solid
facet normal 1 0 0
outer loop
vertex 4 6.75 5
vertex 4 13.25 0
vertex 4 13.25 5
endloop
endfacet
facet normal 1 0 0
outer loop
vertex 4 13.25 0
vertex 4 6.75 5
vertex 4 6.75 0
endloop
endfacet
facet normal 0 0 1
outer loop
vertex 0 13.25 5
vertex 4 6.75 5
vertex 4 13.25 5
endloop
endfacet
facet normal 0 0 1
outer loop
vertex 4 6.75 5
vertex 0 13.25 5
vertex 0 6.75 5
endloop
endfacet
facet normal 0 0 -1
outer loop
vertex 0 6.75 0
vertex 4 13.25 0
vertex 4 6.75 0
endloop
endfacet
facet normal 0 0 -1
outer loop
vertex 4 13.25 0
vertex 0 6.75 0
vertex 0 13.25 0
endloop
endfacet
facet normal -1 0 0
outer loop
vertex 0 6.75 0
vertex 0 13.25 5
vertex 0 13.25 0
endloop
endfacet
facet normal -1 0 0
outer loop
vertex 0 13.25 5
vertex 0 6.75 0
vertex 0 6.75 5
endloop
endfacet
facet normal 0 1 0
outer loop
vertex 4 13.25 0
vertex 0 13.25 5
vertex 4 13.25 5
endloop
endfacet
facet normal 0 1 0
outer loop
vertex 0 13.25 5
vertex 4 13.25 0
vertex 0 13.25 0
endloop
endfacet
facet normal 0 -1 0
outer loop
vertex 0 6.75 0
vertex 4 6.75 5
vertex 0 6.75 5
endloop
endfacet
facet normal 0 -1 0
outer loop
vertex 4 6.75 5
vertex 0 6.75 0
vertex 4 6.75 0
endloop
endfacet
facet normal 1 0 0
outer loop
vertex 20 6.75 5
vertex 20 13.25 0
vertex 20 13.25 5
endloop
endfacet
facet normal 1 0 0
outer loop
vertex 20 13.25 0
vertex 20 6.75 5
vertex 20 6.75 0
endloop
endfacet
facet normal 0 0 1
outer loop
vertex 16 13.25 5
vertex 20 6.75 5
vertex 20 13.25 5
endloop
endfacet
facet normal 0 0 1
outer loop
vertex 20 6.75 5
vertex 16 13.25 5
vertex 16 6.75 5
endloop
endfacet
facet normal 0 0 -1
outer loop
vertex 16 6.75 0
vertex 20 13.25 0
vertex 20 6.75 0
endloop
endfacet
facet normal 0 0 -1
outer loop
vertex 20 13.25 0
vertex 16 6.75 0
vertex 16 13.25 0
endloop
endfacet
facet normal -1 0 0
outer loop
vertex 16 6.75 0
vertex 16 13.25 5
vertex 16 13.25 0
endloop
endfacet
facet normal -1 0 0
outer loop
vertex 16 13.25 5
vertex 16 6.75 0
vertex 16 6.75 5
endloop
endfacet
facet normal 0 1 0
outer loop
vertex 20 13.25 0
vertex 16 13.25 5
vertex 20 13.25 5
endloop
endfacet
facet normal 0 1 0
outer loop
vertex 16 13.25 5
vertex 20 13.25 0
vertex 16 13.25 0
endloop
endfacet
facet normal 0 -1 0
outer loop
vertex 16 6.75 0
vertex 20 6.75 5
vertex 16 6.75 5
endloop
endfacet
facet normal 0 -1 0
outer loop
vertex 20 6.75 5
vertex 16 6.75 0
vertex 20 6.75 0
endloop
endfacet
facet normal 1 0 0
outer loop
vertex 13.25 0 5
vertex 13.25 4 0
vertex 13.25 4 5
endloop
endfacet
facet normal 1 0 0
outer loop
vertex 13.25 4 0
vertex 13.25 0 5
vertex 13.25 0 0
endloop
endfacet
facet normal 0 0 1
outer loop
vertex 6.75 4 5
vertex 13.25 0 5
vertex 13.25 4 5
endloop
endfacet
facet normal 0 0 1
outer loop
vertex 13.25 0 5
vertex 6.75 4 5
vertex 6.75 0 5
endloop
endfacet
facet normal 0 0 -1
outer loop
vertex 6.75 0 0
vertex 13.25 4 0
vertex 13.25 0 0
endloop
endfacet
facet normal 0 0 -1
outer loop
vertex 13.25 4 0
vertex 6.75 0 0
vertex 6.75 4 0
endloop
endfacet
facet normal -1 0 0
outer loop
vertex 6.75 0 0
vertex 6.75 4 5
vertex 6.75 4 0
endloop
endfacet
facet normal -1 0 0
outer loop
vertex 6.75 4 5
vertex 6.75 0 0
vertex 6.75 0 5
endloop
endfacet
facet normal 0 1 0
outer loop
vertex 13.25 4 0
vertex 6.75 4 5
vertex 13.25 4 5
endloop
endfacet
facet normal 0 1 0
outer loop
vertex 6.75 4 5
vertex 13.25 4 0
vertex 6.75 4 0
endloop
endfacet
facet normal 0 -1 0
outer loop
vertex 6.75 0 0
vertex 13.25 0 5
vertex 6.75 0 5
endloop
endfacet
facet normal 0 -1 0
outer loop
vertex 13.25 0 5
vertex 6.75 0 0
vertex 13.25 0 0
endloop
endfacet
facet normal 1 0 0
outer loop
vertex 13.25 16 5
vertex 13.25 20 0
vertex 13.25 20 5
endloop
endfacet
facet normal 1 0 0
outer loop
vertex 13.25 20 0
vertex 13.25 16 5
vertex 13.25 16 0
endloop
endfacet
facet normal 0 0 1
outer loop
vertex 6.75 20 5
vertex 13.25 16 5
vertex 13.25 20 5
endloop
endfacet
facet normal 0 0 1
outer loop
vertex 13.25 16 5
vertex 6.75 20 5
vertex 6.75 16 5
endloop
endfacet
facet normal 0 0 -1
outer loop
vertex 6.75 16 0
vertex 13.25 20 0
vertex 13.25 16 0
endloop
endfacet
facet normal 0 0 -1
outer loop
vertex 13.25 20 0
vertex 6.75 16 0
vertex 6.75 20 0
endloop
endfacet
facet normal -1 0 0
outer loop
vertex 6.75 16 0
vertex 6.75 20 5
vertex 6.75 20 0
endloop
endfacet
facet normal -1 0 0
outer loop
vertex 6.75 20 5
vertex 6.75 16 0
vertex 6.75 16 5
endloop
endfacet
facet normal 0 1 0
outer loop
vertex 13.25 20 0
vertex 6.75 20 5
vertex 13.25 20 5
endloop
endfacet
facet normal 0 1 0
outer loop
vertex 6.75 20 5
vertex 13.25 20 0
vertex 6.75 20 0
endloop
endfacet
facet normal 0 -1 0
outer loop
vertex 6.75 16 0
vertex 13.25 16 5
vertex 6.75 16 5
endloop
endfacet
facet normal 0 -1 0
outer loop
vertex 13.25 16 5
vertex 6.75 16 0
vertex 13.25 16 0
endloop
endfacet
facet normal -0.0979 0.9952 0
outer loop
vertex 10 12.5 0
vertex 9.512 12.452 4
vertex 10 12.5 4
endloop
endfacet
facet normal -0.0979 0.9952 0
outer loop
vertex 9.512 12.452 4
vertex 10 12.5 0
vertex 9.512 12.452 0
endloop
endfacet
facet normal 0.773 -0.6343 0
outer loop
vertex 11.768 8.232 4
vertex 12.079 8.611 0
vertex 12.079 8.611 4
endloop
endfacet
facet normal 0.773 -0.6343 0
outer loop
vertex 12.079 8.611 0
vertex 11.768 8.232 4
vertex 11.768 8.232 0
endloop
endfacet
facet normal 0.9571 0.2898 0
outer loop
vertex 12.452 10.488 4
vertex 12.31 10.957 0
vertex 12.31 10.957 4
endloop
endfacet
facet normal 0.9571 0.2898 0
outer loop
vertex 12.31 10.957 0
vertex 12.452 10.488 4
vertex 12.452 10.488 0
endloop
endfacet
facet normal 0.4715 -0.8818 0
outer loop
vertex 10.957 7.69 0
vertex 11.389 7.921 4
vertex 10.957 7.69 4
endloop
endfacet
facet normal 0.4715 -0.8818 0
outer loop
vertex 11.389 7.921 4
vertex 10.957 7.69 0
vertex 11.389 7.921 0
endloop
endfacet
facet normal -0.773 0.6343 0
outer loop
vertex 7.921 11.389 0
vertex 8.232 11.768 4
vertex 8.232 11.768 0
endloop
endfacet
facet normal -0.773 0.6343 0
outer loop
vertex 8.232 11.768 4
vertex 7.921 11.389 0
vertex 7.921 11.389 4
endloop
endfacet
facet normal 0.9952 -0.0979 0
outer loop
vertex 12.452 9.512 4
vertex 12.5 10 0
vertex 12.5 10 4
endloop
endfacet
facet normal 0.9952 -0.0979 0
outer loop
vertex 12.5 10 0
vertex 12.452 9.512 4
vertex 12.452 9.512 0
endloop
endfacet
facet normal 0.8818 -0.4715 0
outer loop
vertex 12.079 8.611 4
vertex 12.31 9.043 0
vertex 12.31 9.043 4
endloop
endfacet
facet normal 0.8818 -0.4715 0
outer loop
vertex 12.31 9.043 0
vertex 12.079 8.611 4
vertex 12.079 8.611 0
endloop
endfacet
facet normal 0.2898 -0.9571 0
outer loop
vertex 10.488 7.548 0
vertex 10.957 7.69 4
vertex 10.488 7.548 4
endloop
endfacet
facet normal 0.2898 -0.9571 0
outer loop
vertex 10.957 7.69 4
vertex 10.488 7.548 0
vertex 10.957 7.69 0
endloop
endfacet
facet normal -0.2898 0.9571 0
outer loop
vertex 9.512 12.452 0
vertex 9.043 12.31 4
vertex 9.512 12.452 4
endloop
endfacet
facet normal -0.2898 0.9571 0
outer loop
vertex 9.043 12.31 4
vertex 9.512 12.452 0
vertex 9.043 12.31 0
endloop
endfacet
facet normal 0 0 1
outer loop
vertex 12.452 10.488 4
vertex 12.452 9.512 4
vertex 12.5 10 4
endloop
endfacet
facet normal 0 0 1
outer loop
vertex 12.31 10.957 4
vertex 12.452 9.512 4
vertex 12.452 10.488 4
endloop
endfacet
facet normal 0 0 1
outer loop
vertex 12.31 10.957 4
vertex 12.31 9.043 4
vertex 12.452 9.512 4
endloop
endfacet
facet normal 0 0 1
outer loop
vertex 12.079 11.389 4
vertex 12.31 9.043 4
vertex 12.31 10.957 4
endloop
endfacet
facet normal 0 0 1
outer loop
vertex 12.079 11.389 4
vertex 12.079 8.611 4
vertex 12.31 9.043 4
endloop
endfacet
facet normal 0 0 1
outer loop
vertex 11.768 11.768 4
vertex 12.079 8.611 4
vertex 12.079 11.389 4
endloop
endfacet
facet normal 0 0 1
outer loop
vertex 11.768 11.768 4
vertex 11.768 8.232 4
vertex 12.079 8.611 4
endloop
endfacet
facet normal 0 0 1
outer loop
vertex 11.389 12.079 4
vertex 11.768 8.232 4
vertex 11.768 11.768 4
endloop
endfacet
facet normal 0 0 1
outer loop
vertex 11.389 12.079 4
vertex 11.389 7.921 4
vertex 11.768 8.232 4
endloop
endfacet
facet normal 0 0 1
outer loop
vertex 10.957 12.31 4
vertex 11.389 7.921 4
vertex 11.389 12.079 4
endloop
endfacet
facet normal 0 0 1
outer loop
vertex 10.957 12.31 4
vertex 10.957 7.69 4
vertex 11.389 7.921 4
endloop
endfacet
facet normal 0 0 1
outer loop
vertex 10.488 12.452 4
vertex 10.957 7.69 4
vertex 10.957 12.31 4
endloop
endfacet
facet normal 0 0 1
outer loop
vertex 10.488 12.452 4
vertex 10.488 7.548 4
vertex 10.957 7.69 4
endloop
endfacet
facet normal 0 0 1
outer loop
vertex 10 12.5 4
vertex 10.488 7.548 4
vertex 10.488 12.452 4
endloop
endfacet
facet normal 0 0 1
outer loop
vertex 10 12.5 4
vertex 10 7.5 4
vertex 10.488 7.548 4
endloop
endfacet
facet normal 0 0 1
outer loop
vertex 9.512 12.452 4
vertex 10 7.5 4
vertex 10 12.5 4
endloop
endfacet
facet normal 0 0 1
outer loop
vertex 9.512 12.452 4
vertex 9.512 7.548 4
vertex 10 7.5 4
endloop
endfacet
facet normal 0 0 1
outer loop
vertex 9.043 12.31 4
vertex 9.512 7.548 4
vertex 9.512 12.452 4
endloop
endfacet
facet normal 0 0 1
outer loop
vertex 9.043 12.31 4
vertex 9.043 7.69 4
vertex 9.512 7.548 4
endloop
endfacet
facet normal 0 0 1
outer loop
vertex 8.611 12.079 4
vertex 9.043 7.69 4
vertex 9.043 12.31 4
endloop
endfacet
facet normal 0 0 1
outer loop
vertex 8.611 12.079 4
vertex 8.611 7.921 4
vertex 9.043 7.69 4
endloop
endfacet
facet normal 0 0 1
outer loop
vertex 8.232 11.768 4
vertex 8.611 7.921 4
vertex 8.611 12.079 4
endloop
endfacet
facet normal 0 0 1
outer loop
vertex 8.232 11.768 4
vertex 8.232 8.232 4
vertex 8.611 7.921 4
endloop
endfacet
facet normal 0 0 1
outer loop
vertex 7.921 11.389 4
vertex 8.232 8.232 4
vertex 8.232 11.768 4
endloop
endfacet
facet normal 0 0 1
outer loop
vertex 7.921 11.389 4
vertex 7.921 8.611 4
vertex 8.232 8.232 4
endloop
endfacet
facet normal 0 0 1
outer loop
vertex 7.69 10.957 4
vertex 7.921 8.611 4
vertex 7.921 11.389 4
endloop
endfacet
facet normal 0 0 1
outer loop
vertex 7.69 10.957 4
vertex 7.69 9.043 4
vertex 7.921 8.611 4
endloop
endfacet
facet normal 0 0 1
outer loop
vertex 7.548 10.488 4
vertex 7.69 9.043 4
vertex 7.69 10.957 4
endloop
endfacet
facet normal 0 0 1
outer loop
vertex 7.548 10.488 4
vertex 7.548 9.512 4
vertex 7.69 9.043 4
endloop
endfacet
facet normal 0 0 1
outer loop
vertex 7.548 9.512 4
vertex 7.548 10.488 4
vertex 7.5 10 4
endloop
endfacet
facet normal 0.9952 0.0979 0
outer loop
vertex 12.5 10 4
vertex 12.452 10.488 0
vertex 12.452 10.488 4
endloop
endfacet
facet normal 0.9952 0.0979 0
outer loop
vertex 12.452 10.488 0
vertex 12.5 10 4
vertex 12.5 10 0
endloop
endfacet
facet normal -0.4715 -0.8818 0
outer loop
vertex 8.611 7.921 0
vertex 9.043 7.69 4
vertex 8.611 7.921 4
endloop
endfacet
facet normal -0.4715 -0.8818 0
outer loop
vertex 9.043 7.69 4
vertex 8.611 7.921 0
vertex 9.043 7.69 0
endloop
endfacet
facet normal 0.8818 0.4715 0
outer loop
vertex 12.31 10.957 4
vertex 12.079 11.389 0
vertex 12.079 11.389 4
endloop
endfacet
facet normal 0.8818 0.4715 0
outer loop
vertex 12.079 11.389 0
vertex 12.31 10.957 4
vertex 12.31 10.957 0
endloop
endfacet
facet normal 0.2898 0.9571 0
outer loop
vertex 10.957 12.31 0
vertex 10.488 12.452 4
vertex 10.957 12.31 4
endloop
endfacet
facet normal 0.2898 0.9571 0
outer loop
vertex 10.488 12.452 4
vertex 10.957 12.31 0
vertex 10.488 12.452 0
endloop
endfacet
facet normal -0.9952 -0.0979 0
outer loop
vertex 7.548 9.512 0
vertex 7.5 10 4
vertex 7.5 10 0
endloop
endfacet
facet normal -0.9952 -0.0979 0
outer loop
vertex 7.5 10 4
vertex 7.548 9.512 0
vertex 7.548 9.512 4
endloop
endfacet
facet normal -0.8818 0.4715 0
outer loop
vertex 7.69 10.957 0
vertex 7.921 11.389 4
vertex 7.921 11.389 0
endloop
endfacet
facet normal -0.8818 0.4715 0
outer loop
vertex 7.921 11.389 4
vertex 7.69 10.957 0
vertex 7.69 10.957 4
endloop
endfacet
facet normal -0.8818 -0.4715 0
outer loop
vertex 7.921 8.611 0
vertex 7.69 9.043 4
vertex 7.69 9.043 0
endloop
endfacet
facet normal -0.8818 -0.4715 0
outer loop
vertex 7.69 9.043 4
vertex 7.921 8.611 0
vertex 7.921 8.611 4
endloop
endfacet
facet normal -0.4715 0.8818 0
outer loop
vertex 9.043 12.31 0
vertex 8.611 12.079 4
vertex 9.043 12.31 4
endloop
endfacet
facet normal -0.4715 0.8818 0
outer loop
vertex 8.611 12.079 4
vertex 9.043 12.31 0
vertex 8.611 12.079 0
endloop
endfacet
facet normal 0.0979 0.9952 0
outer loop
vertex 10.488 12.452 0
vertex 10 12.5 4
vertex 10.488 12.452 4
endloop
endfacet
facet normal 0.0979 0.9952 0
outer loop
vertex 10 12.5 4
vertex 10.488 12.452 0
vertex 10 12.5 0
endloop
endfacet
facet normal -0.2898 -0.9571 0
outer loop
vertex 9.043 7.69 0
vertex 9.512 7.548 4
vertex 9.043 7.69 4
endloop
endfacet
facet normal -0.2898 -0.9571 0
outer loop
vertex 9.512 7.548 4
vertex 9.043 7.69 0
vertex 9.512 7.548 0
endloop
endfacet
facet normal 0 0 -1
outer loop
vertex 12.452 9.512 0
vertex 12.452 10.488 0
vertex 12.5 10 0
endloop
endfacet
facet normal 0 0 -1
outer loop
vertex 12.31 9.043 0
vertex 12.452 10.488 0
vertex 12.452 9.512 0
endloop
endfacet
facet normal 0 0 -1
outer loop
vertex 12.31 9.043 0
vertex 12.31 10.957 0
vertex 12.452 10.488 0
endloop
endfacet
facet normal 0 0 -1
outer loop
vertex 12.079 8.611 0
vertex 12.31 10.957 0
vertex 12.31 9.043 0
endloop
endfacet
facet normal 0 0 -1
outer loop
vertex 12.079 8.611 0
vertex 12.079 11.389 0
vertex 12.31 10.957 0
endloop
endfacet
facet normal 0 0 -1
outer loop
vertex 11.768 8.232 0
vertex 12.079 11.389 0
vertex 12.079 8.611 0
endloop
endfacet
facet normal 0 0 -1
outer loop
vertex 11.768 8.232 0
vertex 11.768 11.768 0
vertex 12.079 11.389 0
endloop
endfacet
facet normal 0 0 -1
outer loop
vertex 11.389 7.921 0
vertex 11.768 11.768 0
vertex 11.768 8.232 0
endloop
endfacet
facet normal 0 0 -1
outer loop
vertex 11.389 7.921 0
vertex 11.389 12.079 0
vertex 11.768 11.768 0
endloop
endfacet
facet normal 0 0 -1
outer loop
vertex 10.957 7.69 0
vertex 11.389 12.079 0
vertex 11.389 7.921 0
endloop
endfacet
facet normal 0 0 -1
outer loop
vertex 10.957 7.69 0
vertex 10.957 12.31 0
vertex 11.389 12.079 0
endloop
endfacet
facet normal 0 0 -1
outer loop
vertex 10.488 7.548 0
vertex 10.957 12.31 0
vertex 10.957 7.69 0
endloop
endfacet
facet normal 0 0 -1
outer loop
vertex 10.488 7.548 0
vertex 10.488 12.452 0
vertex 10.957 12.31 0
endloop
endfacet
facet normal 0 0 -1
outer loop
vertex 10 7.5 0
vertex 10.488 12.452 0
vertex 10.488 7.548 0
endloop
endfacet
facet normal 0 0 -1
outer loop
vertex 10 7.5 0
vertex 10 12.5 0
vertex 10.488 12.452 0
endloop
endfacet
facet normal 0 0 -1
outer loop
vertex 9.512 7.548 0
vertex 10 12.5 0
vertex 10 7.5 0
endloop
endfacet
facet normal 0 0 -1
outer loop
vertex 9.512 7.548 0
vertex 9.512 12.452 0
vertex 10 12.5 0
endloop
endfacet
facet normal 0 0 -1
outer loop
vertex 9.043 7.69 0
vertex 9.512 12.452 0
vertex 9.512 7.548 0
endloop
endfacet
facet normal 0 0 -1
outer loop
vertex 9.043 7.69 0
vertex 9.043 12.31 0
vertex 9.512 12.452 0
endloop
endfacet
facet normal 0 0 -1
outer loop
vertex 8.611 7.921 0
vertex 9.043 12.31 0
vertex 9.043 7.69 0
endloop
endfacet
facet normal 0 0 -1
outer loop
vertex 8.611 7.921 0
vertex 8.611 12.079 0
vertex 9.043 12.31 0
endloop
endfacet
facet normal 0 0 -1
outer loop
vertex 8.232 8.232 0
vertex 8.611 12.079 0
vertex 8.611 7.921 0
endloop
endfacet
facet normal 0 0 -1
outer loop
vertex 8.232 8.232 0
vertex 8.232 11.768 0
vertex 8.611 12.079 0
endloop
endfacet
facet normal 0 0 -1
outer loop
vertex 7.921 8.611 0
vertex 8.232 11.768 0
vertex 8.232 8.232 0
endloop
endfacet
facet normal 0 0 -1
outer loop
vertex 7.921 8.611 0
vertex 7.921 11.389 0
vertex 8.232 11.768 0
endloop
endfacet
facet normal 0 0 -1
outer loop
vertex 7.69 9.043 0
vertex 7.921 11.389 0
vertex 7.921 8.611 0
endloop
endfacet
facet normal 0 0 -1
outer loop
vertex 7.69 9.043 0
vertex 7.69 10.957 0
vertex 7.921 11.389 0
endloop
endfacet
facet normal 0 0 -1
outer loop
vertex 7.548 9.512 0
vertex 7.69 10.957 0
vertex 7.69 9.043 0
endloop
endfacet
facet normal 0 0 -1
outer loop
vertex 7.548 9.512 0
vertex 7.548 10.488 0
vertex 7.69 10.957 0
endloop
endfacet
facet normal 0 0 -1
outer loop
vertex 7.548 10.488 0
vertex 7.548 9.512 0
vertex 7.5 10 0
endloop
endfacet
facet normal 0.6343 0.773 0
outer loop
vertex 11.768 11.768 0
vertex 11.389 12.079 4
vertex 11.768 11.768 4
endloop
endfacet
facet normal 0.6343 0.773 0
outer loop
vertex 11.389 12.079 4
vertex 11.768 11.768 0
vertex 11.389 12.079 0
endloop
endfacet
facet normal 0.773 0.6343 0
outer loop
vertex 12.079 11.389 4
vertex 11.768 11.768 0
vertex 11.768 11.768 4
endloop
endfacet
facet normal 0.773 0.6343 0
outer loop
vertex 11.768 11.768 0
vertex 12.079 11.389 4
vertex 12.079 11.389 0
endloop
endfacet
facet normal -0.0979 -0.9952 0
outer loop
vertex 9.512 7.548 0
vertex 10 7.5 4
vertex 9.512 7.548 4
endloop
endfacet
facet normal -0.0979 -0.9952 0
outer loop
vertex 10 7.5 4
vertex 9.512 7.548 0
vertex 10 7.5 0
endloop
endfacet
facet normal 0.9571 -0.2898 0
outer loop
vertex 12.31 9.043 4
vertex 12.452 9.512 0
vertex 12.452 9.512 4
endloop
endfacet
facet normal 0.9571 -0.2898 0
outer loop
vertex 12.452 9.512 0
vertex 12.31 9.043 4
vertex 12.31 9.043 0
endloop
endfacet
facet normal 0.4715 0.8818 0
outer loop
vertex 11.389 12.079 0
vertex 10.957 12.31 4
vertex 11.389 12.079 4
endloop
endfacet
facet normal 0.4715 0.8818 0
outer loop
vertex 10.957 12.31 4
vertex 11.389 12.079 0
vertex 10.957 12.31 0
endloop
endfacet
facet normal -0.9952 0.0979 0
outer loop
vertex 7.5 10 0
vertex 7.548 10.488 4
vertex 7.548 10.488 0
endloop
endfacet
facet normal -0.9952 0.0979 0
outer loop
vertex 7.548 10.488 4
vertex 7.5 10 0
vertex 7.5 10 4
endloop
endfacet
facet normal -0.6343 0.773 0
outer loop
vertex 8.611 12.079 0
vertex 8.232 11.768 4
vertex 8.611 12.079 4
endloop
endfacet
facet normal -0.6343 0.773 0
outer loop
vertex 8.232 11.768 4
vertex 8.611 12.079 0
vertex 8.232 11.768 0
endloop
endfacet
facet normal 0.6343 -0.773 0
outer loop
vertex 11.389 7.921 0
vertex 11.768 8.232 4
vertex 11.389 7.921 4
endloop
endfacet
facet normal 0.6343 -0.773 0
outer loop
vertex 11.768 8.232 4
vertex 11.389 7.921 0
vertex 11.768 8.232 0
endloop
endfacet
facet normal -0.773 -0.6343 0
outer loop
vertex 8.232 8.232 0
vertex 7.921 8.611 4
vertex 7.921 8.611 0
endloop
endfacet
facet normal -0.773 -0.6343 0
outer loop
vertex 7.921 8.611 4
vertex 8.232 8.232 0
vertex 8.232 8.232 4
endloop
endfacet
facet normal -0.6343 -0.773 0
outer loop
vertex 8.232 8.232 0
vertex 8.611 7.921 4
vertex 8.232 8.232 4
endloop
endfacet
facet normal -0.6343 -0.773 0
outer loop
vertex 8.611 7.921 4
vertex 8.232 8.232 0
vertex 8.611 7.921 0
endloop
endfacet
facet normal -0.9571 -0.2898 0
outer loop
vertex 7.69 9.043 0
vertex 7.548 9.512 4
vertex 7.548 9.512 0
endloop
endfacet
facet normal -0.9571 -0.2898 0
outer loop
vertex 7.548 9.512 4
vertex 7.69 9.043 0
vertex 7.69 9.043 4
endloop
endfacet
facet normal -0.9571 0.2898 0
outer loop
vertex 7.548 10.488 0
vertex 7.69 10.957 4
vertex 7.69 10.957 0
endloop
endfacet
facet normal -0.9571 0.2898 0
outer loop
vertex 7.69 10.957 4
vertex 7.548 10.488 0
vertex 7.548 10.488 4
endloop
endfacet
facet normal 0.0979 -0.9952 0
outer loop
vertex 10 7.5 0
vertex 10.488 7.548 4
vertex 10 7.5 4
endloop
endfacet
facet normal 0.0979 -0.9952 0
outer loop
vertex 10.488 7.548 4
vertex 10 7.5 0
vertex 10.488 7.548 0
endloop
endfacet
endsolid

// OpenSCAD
//Specify the height
$fn=32;
Height = 0 ; // [1:0.25:5]
InnerDiameter = 5;

2020_ProfileEndcap ();

module 2020_ProfileEndcap() {
    difference () {
        union () {
            //translate ([10,10,0]) cylinder (r=20, h = Height, $fn=6);

            translate ([0,6.75,Height]) cube ([4,6.5,5]);
            translate ([16,6.75,Height]) cube ([4,6.5,5]);

            translate ([6.75,0,Height]) cube ([6.5,4,5]);
            translate ([6.75,16,Height]) cube ([6.5,4,5]);

        }
    }
        translate ([10,10,Height]) rotate ([0,0,0]) cylinder (d=InnerDiameter,h=4);
}
